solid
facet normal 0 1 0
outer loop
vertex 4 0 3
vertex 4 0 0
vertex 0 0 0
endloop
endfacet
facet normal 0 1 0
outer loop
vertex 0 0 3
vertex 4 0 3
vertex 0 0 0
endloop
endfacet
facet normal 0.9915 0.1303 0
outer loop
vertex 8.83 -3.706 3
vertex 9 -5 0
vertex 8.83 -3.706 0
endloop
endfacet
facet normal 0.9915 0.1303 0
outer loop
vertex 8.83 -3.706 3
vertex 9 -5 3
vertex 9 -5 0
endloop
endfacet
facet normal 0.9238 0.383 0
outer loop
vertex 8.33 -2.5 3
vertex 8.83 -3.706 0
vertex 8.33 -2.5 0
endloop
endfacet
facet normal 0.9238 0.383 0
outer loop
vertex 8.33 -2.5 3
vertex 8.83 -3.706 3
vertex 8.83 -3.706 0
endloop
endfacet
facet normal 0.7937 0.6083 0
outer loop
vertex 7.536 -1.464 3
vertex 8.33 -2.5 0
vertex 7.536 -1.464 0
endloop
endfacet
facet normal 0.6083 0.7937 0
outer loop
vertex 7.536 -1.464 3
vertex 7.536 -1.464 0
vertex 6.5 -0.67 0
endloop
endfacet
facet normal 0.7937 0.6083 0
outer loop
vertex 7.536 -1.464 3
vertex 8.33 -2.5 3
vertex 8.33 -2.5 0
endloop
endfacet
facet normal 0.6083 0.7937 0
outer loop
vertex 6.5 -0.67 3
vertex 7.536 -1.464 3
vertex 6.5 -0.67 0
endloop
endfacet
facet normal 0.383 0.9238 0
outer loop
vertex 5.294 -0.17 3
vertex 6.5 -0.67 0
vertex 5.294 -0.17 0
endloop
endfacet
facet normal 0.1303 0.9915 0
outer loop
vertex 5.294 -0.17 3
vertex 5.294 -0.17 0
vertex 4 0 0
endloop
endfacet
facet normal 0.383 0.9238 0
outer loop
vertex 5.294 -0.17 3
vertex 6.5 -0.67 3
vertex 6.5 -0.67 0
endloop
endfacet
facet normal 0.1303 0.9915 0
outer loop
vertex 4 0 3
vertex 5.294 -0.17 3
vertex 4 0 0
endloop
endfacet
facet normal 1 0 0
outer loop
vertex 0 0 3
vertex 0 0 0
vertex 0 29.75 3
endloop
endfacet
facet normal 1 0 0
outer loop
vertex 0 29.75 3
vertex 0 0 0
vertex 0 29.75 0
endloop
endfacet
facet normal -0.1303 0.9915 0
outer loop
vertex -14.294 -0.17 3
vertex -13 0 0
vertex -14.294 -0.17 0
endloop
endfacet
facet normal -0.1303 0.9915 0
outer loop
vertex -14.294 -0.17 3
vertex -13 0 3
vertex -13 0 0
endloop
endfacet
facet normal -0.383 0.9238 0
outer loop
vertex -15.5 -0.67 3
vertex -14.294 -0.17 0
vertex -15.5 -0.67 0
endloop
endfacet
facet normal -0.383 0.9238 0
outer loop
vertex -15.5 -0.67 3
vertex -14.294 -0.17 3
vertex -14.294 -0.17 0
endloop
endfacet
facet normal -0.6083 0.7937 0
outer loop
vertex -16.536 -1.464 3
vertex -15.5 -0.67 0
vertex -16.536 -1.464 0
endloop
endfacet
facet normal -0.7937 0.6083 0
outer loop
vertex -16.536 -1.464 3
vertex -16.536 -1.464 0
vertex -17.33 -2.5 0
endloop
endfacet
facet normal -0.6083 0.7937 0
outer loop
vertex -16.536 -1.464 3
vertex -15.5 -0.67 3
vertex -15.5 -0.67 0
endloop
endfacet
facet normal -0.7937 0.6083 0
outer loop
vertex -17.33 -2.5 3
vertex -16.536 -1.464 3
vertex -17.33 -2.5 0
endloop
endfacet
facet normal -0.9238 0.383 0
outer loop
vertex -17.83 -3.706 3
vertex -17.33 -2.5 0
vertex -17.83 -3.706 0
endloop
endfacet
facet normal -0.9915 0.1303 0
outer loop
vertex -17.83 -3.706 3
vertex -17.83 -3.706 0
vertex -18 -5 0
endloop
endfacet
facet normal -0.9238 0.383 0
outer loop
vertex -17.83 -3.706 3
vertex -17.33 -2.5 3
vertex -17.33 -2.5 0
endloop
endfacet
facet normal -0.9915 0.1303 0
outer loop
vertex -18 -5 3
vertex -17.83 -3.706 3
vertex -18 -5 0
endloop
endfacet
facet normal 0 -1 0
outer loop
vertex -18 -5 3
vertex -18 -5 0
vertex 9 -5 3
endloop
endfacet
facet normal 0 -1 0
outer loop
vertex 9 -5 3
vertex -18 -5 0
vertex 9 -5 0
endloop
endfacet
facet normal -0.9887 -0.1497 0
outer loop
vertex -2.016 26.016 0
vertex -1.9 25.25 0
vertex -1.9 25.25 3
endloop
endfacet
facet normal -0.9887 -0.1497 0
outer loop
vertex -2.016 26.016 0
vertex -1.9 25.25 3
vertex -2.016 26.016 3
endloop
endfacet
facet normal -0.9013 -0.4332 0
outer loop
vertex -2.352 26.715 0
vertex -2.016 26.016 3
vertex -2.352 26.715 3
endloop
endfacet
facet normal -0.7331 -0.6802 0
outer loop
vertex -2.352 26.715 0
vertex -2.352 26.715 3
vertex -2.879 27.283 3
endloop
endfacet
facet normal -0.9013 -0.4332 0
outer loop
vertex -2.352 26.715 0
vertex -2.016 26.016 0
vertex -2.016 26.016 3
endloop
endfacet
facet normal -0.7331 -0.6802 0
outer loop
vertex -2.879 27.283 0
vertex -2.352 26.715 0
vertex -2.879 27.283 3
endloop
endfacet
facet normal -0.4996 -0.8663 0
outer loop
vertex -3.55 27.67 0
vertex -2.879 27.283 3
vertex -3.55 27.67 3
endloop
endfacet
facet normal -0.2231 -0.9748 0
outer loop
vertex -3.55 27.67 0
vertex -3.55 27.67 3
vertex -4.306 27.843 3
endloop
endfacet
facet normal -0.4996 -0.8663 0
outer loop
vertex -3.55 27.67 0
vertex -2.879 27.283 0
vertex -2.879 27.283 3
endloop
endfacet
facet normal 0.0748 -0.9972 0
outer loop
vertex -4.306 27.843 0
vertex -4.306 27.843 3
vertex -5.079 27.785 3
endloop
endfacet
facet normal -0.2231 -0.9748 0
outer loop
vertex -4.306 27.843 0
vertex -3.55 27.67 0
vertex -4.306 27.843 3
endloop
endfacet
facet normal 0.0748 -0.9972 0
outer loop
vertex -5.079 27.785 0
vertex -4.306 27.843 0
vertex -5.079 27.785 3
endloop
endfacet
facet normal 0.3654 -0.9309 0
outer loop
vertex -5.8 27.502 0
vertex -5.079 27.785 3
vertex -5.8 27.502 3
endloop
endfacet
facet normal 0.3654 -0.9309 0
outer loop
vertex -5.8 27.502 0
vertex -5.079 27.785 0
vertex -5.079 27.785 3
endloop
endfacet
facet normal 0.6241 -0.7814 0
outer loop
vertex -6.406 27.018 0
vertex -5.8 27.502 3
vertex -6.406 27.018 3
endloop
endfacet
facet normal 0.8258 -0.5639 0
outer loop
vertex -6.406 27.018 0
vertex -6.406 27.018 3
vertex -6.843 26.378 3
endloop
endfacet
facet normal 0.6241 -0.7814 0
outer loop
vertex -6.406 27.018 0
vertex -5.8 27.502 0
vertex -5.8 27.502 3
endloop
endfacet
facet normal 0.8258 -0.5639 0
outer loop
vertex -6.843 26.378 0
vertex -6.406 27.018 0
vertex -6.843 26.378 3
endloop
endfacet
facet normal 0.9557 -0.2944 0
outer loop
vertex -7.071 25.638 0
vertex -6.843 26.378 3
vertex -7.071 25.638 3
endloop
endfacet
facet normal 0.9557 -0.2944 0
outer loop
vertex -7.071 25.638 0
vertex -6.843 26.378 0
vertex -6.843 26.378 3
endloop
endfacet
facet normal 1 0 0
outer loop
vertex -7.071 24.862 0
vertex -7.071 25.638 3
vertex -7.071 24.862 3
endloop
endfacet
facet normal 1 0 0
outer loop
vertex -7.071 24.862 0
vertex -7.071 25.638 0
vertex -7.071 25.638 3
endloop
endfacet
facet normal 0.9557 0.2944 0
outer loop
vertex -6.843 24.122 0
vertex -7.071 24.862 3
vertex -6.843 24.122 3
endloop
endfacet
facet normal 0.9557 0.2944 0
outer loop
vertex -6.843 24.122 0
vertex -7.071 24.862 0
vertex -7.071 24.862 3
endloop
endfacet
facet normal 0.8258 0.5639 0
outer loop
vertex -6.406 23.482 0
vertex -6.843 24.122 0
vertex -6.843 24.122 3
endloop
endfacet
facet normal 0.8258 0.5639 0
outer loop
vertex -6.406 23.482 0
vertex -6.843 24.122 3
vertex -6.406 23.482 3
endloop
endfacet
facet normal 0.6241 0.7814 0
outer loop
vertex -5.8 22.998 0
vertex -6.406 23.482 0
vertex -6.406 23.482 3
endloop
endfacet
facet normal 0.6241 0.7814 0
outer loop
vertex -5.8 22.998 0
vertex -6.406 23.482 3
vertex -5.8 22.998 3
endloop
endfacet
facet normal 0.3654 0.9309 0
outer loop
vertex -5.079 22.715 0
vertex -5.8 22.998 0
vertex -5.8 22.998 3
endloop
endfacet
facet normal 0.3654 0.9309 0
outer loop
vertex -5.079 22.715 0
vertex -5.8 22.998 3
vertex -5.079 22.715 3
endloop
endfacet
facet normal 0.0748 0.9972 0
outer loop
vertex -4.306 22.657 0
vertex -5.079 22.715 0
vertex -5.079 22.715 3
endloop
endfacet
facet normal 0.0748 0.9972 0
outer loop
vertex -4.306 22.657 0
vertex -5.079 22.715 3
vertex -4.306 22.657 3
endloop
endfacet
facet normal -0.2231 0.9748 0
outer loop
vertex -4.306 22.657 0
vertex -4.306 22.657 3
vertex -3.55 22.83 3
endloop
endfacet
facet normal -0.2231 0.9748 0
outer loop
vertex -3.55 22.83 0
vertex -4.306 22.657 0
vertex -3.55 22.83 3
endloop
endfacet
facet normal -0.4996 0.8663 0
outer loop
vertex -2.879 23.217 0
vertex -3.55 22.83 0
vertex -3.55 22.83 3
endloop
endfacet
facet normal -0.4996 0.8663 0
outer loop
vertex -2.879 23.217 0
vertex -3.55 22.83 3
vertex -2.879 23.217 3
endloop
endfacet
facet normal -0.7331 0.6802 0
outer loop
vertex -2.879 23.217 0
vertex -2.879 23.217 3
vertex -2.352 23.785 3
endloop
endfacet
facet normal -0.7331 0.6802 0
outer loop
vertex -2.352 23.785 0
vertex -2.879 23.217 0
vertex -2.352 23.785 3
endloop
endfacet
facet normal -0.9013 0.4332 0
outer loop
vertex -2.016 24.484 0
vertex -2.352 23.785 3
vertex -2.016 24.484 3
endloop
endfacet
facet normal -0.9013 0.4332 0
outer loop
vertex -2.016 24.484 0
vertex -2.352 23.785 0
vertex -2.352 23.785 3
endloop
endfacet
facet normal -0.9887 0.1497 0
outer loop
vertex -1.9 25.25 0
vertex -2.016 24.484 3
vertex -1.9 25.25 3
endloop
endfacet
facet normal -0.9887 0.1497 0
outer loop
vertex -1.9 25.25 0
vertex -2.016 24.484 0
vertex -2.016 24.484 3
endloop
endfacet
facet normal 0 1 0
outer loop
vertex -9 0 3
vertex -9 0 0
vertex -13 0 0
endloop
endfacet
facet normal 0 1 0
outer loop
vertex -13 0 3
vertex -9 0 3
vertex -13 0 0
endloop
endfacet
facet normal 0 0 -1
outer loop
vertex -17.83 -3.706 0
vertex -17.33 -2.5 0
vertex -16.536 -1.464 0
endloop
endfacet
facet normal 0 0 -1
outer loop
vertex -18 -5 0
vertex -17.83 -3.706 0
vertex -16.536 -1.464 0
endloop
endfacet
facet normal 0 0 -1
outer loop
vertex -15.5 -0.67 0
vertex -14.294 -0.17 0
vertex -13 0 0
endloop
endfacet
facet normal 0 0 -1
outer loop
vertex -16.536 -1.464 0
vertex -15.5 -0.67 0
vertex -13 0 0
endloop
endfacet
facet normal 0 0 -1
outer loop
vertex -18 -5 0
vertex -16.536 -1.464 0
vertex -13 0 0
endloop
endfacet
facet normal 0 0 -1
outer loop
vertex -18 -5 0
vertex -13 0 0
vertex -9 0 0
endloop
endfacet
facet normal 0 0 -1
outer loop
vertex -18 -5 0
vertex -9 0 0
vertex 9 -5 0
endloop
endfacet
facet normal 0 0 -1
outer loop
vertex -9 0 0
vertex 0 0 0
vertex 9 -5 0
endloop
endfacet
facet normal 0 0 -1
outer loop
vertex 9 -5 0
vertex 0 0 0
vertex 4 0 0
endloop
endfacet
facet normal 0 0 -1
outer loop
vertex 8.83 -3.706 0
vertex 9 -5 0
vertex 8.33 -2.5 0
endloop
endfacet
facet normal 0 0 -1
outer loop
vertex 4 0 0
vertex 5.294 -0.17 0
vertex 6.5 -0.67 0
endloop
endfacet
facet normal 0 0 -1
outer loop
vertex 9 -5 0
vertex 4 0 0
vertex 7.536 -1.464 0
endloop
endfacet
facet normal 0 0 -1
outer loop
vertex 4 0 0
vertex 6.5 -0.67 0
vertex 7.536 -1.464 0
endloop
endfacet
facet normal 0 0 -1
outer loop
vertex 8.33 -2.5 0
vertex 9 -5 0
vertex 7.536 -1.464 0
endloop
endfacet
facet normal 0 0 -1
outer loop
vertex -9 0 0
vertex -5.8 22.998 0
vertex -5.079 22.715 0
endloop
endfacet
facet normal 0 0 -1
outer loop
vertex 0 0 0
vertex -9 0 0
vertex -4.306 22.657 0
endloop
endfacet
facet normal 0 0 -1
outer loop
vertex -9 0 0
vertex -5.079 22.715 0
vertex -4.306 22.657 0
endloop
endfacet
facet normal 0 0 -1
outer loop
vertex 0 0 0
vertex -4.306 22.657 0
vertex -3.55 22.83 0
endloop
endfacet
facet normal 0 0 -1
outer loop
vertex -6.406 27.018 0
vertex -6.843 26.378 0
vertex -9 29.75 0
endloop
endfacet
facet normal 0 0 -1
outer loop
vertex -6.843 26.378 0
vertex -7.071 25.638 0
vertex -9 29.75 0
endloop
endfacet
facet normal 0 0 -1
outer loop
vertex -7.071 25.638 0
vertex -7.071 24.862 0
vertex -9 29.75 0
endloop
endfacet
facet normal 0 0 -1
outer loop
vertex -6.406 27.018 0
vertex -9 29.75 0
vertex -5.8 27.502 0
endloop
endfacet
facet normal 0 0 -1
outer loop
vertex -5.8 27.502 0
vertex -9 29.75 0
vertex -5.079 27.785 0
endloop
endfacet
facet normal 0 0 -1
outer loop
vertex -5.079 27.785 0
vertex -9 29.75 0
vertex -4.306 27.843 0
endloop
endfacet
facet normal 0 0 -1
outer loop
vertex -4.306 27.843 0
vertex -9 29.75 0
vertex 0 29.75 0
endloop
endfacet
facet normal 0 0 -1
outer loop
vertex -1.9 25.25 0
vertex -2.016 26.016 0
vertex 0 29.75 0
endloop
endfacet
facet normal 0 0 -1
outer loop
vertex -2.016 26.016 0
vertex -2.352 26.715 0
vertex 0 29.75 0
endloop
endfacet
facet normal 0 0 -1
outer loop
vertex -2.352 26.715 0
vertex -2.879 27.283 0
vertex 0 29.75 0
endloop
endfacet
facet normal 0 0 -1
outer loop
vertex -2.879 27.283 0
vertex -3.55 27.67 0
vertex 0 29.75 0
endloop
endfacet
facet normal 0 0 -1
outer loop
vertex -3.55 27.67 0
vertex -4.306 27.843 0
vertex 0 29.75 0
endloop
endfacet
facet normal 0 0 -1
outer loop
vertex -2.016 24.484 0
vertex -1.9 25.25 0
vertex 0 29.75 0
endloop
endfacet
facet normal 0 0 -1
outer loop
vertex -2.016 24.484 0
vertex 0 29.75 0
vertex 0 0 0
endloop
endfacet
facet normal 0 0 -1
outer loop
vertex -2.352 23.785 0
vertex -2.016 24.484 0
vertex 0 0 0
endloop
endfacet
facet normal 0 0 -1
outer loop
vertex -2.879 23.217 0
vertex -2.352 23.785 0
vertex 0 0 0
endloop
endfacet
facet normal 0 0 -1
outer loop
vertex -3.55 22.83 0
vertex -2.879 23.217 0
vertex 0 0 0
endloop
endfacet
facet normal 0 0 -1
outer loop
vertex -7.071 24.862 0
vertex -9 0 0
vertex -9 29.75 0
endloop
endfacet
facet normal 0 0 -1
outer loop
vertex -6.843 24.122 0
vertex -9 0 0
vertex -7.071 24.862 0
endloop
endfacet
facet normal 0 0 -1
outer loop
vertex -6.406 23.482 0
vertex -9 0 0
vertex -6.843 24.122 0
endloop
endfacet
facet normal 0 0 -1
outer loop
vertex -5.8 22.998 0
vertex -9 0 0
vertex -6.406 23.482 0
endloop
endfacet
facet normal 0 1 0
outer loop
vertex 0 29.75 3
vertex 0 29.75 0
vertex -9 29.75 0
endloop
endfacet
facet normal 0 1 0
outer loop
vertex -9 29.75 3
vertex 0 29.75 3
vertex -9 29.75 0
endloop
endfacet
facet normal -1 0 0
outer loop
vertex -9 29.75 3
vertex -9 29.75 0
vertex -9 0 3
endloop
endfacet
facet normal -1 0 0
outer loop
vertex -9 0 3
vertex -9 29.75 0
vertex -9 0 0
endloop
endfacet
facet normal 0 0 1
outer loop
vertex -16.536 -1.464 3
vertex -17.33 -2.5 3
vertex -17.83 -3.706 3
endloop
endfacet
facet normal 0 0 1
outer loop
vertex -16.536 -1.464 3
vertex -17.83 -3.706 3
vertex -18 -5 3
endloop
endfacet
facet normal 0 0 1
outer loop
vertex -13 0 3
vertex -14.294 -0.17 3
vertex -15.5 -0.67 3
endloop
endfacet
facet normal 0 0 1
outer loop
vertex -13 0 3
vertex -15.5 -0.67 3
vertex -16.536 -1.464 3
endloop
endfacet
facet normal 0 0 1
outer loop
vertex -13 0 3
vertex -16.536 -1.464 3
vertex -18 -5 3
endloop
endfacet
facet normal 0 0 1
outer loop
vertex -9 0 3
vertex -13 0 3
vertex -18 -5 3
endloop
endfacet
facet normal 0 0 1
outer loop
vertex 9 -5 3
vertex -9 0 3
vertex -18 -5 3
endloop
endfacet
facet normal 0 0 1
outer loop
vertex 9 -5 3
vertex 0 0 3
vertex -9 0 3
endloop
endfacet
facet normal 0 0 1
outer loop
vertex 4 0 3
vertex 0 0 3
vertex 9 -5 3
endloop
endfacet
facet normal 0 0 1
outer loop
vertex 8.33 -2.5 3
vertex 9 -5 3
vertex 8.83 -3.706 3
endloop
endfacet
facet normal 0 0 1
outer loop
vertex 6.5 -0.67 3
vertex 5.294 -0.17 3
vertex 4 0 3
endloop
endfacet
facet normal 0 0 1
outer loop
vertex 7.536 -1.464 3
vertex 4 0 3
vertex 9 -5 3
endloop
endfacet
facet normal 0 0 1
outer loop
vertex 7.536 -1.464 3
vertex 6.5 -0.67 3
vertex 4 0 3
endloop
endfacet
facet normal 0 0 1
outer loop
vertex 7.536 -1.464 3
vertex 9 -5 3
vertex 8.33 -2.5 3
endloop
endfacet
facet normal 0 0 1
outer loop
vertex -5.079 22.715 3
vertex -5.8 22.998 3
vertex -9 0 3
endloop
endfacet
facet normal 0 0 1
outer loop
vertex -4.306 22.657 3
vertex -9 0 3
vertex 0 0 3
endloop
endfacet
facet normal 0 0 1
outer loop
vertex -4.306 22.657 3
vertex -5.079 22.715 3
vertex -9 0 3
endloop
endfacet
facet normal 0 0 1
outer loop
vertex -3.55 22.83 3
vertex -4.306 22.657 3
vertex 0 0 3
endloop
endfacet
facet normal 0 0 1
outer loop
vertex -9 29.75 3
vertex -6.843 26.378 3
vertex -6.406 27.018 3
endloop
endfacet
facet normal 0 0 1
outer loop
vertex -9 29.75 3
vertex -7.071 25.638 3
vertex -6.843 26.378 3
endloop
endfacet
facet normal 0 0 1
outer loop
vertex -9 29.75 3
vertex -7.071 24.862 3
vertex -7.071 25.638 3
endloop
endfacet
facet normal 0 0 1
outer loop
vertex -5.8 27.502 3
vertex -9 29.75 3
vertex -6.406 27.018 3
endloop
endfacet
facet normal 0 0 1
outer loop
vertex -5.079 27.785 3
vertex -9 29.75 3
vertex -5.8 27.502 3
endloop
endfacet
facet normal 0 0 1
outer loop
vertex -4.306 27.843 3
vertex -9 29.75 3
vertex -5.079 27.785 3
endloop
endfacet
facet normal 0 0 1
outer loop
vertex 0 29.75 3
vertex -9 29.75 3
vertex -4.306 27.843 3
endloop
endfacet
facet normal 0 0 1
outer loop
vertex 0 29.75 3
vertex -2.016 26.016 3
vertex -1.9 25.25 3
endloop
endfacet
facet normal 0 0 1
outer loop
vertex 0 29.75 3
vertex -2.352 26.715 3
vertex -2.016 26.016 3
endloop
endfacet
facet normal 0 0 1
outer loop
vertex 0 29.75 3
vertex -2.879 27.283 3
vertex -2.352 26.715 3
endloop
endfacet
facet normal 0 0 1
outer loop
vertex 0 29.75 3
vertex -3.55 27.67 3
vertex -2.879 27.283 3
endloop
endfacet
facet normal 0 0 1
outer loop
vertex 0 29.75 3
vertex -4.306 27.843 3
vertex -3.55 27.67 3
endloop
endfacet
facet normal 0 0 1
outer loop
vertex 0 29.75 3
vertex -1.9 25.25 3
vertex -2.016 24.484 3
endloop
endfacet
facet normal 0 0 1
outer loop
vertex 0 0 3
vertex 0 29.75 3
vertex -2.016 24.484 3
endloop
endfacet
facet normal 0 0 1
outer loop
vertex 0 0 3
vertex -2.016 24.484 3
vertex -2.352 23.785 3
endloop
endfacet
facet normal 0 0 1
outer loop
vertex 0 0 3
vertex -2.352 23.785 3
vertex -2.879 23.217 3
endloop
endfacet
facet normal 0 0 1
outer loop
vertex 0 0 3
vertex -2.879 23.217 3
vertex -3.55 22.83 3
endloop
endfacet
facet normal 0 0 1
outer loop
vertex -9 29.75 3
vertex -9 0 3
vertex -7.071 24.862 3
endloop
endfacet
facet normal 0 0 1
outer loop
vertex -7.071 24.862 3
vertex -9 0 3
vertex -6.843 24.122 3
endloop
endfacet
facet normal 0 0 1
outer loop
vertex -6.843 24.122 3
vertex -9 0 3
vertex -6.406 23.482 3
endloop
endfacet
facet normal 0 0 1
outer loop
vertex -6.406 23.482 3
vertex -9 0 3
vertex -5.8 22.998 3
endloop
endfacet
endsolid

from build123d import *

# Parameters (mm, degrees)
ESQUISSE1_R        = 2.6
BOSS_EXTRU_1_DEPTH = 3
CONG_1_R           = 5
CONG_2_R           = 5


with BuildPart() as part:
    # Esquisse1 → Boss.-Extru.1 (new body)
    with BuildSketch(Plane.XY):
        Polygon((-9, 0), (-18, 0), (-18, -5), (9, -5), (9, 0), (0, 0), (0, 29.75), (-9, 29.75), align=None)
        with Locations((-4.5, 25.25)):
            Circle(ESQUISSE1_R, mode=Mode.SUBTRACT)
    extrude(amount=BOSS_EXTRU_1_DEPTH)

    # Congé1
    cong_1_edges = [part.edges().sort_by_distance(p)[0] for p in [
        (-18, 0, 1.5),
    ]]
    fillet(cong_1_edges, radius=CONG_1_R - 0.0001)  # a hair under: the kernel refuses the full size

    # Congé2
    cong_2_edges = [part.edges().sort_by_distance(p)[0] for p in [
        (9, 0, 1.5),
    ]]
    fillet(cong_2_edges, radius=CONG_2_R - 0.0001)  # a hair under: the kernel refuses the full size


solid = part.part
